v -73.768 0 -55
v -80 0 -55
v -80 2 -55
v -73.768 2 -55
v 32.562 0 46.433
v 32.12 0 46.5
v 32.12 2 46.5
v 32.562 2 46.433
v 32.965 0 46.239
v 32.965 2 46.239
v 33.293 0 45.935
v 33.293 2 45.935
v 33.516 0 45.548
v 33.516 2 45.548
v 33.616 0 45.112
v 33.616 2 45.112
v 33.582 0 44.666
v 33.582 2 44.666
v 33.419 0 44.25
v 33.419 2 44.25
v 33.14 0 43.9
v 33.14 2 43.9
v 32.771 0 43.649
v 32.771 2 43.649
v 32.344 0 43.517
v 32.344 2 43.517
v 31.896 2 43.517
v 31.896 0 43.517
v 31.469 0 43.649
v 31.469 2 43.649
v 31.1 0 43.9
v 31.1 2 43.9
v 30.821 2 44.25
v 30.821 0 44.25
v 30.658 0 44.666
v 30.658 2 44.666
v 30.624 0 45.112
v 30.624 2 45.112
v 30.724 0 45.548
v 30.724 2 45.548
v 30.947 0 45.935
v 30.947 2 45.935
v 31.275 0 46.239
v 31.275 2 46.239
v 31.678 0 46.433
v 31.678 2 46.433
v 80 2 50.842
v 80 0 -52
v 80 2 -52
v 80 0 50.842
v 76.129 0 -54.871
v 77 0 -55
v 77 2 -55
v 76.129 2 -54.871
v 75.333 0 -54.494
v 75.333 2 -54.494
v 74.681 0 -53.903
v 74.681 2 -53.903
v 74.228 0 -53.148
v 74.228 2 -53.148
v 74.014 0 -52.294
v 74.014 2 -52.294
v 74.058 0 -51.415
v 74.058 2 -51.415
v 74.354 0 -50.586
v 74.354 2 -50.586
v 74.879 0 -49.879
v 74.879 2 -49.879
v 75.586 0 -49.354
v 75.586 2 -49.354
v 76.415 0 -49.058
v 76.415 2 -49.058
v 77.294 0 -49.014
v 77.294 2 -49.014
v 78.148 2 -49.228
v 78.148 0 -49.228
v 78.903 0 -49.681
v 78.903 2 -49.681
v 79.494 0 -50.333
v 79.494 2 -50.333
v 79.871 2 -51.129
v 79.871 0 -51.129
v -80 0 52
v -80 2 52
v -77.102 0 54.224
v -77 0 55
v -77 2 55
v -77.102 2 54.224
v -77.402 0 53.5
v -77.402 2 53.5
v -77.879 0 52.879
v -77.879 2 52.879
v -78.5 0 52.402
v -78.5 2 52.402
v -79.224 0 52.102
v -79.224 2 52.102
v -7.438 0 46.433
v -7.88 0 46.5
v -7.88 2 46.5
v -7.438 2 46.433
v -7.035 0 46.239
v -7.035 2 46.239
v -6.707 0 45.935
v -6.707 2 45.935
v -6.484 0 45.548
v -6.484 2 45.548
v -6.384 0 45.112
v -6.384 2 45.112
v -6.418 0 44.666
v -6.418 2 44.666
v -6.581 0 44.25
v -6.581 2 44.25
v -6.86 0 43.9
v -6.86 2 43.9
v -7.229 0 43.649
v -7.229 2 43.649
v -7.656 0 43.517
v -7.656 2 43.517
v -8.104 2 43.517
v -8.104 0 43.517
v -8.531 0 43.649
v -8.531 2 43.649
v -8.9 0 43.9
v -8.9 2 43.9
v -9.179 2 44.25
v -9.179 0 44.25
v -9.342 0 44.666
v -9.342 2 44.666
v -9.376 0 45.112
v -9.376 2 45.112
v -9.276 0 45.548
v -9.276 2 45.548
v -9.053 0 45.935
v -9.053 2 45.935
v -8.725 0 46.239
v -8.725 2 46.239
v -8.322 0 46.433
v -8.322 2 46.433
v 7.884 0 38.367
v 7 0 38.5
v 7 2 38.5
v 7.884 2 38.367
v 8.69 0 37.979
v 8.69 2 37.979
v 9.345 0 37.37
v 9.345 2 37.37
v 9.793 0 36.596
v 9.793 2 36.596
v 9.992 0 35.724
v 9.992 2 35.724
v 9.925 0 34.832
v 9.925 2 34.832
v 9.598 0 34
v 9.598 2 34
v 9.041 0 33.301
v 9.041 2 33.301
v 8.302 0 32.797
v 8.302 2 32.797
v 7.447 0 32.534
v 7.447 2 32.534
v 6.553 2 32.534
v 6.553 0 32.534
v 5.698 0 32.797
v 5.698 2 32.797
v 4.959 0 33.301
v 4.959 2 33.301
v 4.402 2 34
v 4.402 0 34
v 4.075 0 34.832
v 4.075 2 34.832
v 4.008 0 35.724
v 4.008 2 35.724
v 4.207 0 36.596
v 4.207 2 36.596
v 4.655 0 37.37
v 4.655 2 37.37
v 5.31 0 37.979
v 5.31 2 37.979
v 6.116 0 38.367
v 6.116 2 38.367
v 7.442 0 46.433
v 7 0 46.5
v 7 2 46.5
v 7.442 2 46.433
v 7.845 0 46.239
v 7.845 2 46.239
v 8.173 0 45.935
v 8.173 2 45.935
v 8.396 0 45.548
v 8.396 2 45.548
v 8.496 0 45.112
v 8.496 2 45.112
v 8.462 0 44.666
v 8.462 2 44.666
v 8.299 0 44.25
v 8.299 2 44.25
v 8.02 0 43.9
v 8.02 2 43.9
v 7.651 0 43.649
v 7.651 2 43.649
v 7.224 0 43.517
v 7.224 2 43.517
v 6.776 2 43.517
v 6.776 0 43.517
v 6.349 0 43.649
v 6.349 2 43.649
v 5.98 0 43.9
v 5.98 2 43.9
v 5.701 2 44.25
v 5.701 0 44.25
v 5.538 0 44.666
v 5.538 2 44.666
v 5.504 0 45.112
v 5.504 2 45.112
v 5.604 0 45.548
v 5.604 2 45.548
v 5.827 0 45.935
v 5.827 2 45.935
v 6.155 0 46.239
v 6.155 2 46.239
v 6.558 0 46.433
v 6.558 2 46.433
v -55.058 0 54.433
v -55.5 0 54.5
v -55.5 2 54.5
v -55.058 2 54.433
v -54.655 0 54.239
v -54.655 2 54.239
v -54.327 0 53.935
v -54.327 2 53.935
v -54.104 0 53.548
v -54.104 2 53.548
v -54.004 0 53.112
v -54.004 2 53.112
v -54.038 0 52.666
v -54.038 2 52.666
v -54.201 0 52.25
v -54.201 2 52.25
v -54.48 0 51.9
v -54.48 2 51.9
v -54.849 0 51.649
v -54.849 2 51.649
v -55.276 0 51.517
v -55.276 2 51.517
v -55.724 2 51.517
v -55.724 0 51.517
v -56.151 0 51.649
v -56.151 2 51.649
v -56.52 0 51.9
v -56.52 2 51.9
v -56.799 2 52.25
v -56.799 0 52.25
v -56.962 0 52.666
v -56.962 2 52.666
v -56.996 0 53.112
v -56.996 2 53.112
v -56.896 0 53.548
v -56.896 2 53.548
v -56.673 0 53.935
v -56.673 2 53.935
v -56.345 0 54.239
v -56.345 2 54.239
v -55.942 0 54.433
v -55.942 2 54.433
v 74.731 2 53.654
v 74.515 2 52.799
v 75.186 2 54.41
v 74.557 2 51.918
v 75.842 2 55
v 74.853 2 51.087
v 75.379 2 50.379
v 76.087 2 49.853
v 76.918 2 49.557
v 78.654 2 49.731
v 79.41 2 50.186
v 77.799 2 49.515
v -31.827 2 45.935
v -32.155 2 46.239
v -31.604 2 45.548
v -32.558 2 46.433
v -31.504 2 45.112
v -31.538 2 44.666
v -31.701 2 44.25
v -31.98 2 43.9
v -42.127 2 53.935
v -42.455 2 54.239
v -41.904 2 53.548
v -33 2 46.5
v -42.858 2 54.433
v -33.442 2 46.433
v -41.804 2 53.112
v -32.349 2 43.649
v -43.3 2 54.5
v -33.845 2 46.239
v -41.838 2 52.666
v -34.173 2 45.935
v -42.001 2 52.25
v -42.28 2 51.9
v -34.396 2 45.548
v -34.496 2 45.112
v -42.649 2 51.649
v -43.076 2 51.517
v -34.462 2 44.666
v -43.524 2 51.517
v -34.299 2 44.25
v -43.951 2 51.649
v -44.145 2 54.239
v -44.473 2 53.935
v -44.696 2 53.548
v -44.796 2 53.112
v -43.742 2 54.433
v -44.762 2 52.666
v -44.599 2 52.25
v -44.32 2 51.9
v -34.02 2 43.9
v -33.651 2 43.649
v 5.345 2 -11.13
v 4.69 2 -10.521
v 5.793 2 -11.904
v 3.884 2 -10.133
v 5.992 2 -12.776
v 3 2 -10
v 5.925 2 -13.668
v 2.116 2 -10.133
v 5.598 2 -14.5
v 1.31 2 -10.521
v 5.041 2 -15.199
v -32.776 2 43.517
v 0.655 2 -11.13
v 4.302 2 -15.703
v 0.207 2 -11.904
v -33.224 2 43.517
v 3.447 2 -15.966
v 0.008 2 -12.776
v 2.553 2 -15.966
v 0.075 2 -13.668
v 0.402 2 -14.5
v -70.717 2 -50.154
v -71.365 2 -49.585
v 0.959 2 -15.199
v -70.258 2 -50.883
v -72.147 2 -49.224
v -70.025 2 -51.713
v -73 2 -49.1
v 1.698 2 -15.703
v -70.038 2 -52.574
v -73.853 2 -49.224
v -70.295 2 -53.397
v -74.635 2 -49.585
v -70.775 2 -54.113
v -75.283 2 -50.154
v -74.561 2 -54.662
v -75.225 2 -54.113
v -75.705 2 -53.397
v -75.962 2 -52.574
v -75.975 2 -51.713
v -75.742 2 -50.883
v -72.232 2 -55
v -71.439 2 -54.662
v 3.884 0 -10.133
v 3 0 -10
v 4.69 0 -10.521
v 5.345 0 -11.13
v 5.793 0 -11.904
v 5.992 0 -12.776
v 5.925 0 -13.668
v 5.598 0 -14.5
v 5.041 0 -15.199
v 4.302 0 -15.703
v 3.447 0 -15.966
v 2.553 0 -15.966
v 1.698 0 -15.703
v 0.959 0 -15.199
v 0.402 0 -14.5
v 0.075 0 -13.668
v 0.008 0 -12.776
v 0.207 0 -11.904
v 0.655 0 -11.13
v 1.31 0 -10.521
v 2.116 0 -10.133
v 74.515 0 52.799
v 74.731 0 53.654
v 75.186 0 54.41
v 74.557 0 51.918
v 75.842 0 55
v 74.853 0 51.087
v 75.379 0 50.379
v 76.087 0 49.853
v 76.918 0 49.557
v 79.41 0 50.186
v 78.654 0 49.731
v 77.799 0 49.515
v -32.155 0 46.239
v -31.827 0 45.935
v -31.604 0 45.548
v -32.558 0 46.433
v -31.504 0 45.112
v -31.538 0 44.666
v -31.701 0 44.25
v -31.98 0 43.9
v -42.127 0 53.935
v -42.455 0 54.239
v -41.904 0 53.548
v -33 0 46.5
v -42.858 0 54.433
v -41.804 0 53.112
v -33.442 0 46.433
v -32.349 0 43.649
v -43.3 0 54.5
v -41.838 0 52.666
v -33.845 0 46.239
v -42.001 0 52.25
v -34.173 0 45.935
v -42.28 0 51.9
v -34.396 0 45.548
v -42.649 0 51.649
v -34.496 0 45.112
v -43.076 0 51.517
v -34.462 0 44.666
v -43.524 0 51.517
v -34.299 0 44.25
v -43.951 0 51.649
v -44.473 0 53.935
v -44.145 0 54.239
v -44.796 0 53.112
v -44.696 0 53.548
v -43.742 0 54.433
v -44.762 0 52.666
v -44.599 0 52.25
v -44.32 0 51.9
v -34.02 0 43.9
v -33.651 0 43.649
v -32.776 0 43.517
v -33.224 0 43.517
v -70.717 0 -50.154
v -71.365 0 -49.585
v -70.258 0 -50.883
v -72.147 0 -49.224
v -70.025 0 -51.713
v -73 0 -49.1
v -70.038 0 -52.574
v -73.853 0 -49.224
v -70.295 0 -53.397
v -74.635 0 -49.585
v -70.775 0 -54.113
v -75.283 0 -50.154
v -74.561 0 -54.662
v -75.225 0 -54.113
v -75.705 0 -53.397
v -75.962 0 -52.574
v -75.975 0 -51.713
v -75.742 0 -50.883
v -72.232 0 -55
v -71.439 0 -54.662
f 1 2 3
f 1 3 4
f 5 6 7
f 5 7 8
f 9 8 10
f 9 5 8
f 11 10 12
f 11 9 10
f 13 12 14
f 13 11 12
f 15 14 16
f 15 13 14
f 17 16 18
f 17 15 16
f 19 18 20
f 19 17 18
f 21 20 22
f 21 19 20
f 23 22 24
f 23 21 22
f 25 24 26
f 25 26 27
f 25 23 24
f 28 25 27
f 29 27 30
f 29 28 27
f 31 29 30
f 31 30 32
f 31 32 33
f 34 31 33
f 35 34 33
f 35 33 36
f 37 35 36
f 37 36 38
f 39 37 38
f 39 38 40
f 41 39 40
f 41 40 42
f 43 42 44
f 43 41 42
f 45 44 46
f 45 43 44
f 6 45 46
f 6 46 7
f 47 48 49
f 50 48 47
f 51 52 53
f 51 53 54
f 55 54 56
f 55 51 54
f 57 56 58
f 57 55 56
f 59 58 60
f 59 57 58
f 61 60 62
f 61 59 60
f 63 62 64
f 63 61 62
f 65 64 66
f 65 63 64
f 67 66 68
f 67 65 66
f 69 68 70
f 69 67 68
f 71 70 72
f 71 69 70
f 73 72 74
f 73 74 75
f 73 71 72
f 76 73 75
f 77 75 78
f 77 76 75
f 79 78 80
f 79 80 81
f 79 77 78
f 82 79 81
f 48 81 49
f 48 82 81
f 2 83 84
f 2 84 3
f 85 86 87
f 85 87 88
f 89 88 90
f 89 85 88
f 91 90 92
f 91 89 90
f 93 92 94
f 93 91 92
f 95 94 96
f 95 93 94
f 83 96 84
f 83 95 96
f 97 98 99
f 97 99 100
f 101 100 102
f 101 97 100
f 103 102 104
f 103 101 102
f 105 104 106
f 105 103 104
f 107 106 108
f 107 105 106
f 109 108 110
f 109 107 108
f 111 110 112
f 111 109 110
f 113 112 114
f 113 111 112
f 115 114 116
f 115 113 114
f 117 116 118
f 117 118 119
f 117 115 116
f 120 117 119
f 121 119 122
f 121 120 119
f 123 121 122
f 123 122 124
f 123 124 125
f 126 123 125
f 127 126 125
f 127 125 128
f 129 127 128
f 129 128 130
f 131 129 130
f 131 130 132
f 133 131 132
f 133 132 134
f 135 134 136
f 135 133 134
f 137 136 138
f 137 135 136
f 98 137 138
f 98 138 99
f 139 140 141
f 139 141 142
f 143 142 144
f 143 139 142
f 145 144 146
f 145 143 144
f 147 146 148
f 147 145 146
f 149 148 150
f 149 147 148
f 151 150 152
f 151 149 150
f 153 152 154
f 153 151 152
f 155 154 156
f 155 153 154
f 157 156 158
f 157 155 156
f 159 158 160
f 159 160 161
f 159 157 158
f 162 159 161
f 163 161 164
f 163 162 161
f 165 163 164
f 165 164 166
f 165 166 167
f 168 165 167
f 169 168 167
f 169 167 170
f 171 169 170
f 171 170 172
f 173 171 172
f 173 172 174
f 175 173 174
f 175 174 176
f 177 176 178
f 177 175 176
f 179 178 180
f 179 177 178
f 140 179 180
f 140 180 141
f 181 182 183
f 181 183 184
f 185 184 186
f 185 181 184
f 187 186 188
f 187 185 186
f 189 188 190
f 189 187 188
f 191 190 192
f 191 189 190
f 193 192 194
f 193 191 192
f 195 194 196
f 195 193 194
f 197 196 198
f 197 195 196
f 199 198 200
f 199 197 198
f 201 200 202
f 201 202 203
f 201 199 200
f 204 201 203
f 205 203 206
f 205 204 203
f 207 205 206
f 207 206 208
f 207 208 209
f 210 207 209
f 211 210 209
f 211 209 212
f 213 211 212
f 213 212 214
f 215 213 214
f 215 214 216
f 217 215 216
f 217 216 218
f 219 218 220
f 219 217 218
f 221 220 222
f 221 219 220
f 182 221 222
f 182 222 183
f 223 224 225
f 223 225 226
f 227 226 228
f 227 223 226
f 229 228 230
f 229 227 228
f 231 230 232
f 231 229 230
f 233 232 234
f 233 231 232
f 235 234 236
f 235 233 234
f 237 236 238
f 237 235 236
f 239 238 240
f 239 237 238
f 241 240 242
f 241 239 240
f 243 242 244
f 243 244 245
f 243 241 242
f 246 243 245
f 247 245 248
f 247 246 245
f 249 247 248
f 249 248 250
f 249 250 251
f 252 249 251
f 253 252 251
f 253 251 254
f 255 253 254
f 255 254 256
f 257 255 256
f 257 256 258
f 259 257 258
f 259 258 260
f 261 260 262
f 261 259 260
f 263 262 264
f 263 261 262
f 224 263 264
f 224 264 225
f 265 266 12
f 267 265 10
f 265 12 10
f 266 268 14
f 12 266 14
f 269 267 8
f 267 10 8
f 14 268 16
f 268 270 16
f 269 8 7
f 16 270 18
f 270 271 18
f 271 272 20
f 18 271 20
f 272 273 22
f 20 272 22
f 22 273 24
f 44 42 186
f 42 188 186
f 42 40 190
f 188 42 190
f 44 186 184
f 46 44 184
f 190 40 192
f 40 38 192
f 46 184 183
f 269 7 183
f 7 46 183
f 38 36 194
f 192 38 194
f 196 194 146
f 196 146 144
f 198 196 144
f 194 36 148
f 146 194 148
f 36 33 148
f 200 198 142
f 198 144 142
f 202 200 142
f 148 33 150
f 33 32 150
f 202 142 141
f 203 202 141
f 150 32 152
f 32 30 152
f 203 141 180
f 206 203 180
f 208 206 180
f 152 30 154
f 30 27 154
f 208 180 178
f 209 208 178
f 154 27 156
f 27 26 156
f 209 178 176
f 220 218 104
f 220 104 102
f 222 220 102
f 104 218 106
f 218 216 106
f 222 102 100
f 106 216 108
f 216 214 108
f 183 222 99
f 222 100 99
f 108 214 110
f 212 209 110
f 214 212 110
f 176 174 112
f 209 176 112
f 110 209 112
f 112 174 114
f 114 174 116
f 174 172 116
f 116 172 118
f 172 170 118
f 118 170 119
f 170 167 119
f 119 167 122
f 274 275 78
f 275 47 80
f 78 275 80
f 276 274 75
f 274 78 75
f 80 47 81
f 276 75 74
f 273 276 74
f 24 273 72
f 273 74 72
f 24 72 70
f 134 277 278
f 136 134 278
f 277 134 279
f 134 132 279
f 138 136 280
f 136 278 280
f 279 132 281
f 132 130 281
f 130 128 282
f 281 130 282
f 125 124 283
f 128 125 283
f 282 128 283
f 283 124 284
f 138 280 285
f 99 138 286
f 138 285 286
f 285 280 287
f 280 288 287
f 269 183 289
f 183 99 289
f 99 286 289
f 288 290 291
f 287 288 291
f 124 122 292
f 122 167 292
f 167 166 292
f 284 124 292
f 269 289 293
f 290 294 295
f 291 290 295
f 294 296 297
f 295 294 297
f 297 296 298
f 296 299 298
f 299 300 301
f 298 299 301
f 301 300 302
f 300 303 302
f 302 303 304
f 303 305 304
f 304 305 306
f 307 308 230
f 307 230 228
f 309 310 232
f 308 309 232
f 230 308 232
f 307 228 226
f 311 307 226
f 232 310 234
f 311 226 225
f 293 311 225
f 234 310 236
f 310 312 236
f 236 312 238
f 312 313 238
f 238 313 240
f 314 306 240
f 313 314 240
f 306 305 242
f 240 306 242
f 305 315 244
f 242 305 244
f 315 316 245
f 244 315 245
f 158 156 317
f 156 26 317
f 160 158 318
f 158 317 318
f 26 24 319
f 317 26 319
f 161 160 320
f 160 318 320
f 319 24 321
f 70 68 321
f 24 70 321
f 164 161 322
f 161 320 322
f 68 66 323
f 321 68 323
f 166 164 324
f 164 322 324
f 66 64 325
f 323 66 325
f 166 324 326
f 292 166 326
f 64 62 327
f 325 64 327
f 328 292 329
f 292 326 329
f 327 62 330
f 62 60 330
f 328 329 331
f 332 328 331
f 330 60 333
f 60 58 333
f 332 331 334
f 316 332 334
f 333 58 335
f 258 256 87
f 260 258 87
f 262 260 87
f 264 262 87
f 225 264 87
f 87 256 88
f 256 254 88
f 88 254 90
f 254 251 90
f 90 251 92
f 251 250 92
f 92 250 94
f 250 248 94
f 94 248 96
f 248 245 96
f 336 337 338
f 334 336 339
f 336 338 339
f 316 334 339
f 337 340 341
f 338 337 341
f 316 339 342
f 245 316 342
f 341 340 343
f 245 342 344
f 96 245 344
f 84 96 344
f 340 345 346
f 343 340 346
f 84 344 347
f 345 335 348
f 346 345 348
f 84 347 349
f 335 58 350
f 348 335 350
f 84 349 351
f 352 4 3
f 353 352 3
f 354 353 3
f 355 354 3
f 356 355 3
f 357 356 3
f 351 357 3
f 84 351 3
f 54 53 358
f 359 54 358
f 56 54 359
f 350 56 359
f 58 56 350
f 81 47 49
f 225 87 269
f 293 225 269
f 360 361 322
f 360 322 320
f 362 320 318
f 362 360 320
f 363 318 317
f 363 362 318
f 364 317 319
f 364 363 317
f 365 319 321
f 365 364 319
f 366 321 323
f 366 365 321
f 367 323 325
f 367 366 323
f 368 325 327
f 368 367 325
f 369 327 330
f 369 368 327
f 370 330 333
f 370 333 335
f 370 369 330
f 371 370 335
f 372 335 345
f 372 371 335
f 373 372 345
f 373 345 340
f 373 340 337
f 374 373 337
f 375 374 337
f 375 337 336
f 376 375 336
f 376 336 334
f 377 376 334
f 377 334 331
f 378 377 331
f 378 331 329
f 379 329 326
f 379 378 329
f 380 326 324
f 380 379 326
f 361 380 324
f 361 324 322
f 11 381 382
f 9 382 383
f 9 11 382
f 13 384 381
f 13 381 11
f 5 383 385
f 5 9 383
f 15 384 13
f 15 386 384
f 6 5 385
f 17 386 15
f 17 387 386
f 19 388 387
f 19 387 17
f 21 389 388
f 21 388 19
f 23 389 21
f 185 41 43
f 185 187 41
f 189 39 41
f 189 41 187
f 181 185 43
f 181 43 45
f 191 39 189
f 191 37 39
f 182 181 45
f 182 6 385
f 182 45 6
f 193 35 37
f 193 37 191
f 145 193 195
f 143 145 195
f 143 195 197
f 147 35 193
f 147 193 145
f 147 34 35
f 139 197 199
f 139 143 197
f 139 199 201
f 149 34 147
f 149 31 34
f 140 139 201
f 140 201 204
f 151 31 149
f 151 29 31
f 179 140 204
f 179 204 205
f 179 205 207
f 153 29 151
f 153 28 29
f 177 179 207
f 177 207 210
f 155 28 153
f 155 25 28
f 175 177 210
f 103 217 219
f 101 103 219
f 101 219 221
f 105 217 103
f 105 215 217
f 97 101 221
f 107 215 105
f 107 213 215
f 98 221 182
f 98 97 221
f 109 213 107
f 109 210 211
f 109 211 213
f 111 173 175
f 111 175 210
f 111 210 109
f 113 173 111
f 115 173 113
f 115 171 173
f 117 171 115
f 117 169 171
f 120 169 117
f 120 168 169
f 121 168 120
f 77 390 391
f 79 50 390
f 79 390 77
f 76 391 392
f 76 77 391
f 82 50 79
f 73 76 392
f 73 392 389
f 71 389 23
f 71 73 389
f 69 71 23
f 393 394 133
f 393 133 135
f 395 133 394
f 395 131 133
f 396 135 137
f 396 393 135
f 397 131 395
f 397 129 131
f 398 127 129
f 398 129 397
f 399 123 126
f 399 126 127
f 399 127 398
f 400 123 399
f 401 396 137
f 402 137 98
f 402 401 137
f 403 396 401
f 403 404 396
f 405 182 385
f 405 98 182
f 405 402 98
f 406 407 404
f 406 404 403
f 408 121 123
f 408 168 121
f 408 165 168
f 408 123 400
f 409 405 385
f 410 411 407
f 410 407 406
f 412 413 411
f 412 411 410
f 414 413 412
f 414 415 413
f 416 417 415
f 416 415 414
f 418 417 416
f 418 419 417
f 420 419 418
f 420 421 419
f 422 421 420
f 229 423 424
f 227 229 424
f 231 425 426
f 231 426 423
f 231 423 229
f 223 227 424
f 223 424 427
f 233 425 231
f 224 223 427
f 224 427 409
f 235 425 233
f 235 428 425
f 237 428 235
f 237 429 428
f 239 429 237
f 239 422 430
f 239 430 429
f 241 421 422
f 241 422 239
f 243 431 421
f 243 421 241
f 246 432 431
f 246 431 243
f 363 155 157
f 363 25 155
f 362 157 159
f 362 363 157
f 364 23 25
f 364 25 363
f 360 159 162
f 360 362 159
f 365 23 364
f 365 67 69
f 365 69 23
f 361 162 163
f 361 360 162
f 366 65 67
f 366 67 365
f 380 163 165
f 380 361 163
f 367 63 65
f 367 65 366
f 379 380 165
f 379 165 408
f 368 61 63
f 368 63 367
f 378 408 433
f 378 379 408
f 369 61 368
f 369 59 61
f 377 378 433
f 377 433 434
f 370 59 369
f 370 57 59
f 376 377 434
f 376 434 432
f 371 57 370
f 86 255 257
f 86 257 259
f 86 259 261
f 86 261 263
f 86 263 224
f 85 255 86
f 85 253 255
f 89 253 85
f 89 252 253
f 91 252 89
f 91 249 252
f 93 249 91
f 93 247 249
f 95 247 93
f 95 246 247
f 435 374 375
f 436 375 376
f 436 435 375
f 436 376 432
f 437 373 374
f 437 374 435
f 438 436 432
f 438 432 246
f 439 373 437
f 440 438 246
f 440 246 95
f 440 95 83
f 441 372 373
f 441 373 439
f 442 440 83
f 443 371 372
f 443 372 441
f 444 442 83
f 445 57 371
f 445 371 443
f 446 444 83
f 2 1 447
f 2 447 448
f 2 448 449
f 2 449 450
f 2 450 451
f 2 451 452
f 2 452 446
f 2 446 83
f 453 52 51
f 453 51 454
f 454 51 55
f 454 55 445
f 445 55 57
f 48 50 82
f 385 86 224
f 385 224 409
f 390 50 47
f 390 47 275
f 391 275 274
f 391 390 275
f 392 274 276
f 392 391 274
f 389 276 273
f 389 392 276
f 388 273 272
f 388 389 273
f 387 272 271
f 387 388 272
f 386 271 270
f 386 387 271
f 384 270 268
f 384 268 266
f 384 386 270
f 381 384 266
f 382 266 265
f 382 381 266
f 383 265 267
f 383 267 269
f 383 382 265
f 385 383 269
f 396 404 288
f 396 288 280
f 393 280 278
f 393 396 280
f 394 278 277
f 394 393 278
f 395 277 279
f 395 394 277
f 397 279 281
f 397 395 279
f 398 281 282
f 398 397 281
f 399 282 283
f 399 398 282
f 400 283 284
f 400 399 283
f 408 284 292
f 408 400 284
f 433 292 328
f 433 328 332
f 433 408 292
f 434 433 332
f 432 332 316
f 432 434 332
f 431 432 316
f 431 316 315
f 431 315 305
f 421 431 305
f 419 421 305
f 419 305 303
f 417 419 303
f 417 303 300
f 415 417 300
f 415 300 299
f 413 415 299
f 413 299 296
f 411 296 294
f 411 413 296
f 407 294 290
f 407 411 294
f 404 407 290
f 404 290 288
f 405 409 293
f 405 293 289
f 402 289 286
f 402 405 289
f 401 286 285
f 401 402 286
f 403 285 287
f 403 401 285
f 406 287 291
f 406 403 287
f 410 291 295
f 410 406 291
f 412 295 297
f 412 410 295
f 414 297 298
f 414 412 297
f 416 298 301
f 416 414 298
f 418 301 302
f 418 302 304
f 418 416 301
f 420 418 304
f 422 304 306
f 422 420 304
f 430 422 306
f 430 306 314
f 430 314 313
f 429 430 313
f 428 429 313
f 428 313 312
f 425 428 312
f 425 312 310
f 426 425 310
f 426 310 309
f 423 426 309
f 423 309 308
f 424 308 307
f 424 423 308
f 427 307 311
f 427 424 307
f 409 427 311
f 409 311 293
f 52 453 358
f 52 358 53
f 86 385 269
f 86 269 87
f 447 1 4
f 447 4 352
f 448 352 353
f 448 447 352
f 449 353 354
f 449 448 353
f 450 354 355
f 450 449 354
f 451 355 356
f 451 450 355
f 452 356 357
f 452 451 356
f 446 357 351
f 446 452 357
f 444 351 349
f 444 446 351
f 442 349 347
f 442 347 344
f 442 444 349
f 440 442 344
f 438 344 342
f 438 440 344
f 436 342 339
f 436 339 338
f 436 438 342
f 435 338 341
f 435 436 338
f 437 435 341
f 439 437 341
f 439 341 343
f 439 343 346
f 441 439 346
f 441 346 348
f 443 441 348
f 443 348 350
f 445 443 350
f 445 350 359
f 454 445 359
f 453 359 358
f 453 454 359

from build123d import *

# Parameters (mm, degrees)
IZIM1_R                     = 3
IZIM1_R_2                   = 1.5
Y_KSEKLIK_EKSTR_ZYON1_DEPTH = 2


with BuildPart() as part:
    # Çizim1 → Yükseklik-Ekstrüzyon1 (new body)
    with BuildSketch(Plane(origin=(0, 0, 0), x_dir=(1, 0, 0), z_dir=(0, 1, 0))):
        with BuildLine():
            Line((-80, 55), (-73.768114575, 55))
            ThreePointArc((-73.768114575, 55), (-73, 49.1), (-72.231885425, 55))
            Line((-72.231885425, 55), (77, 55))
            ThreePointArc((77, 55), (74.878679656, 49.878679656), (80, 52))
            Line((80, 52), (80, -50.841687605))
            ThreePointArc((80, -50.841687605), (75.378679656, -50.378679656), (75.841687605, -55))
            Line((75.841687605, -55), (-77, -55))
            ThreePointArc((-77, -55), (-77.878679656, -52.878679656), (-80, -52))
            Line((-80, -52), (-80, 55))
        make_face()
        with Locations(Location((7, -35.5, 0), (0, 0, 270))):
            Circle(IZIM1_R, mode=Mode.SUBTRACT)
        with Locations(Location((3, 13, 0), (0, 0, 270))):
            Circle(IZIM1_R, mode=Mode.SUBTRACT)
        with Locations(Location((-33, -45, 0), (0, 0, 270))):
            Circle(IZIM1_R_2, mode=Mode.SUBTRACT)
        with Locations(Location((-7.88, -45, 0), (0, 0, 270))):
            Circle(IZIM1_R_2, mode=Mode.SUBTRACT)
        with Locations(Location((7, -45, 0), (0, 0, 270))):
            Circle(IZIM1_R_2, mode=Mode.SUBTRACT)
        with Locations(Location((32.12, -45, 0), (0, 0, 270))):
            Circle(IZIM1_R_2, mode=Mode.SUBTRACT)
        with Locations(Location((-55.5, -53, 0), (0, 0, 270))):
            Circle(IZIM1_R_2, mode=Mode.SUBTRACT)
        with Locations(Location((-43.3, -53, 0), (0, 0, 270))):
            Circle(IZIM1_R_2, mode=Mode.SUBTRACT)
    extrude(amount=Y_KSEKLIK_EKSTR_ZYON1_DEPTH)


solid = part.part
